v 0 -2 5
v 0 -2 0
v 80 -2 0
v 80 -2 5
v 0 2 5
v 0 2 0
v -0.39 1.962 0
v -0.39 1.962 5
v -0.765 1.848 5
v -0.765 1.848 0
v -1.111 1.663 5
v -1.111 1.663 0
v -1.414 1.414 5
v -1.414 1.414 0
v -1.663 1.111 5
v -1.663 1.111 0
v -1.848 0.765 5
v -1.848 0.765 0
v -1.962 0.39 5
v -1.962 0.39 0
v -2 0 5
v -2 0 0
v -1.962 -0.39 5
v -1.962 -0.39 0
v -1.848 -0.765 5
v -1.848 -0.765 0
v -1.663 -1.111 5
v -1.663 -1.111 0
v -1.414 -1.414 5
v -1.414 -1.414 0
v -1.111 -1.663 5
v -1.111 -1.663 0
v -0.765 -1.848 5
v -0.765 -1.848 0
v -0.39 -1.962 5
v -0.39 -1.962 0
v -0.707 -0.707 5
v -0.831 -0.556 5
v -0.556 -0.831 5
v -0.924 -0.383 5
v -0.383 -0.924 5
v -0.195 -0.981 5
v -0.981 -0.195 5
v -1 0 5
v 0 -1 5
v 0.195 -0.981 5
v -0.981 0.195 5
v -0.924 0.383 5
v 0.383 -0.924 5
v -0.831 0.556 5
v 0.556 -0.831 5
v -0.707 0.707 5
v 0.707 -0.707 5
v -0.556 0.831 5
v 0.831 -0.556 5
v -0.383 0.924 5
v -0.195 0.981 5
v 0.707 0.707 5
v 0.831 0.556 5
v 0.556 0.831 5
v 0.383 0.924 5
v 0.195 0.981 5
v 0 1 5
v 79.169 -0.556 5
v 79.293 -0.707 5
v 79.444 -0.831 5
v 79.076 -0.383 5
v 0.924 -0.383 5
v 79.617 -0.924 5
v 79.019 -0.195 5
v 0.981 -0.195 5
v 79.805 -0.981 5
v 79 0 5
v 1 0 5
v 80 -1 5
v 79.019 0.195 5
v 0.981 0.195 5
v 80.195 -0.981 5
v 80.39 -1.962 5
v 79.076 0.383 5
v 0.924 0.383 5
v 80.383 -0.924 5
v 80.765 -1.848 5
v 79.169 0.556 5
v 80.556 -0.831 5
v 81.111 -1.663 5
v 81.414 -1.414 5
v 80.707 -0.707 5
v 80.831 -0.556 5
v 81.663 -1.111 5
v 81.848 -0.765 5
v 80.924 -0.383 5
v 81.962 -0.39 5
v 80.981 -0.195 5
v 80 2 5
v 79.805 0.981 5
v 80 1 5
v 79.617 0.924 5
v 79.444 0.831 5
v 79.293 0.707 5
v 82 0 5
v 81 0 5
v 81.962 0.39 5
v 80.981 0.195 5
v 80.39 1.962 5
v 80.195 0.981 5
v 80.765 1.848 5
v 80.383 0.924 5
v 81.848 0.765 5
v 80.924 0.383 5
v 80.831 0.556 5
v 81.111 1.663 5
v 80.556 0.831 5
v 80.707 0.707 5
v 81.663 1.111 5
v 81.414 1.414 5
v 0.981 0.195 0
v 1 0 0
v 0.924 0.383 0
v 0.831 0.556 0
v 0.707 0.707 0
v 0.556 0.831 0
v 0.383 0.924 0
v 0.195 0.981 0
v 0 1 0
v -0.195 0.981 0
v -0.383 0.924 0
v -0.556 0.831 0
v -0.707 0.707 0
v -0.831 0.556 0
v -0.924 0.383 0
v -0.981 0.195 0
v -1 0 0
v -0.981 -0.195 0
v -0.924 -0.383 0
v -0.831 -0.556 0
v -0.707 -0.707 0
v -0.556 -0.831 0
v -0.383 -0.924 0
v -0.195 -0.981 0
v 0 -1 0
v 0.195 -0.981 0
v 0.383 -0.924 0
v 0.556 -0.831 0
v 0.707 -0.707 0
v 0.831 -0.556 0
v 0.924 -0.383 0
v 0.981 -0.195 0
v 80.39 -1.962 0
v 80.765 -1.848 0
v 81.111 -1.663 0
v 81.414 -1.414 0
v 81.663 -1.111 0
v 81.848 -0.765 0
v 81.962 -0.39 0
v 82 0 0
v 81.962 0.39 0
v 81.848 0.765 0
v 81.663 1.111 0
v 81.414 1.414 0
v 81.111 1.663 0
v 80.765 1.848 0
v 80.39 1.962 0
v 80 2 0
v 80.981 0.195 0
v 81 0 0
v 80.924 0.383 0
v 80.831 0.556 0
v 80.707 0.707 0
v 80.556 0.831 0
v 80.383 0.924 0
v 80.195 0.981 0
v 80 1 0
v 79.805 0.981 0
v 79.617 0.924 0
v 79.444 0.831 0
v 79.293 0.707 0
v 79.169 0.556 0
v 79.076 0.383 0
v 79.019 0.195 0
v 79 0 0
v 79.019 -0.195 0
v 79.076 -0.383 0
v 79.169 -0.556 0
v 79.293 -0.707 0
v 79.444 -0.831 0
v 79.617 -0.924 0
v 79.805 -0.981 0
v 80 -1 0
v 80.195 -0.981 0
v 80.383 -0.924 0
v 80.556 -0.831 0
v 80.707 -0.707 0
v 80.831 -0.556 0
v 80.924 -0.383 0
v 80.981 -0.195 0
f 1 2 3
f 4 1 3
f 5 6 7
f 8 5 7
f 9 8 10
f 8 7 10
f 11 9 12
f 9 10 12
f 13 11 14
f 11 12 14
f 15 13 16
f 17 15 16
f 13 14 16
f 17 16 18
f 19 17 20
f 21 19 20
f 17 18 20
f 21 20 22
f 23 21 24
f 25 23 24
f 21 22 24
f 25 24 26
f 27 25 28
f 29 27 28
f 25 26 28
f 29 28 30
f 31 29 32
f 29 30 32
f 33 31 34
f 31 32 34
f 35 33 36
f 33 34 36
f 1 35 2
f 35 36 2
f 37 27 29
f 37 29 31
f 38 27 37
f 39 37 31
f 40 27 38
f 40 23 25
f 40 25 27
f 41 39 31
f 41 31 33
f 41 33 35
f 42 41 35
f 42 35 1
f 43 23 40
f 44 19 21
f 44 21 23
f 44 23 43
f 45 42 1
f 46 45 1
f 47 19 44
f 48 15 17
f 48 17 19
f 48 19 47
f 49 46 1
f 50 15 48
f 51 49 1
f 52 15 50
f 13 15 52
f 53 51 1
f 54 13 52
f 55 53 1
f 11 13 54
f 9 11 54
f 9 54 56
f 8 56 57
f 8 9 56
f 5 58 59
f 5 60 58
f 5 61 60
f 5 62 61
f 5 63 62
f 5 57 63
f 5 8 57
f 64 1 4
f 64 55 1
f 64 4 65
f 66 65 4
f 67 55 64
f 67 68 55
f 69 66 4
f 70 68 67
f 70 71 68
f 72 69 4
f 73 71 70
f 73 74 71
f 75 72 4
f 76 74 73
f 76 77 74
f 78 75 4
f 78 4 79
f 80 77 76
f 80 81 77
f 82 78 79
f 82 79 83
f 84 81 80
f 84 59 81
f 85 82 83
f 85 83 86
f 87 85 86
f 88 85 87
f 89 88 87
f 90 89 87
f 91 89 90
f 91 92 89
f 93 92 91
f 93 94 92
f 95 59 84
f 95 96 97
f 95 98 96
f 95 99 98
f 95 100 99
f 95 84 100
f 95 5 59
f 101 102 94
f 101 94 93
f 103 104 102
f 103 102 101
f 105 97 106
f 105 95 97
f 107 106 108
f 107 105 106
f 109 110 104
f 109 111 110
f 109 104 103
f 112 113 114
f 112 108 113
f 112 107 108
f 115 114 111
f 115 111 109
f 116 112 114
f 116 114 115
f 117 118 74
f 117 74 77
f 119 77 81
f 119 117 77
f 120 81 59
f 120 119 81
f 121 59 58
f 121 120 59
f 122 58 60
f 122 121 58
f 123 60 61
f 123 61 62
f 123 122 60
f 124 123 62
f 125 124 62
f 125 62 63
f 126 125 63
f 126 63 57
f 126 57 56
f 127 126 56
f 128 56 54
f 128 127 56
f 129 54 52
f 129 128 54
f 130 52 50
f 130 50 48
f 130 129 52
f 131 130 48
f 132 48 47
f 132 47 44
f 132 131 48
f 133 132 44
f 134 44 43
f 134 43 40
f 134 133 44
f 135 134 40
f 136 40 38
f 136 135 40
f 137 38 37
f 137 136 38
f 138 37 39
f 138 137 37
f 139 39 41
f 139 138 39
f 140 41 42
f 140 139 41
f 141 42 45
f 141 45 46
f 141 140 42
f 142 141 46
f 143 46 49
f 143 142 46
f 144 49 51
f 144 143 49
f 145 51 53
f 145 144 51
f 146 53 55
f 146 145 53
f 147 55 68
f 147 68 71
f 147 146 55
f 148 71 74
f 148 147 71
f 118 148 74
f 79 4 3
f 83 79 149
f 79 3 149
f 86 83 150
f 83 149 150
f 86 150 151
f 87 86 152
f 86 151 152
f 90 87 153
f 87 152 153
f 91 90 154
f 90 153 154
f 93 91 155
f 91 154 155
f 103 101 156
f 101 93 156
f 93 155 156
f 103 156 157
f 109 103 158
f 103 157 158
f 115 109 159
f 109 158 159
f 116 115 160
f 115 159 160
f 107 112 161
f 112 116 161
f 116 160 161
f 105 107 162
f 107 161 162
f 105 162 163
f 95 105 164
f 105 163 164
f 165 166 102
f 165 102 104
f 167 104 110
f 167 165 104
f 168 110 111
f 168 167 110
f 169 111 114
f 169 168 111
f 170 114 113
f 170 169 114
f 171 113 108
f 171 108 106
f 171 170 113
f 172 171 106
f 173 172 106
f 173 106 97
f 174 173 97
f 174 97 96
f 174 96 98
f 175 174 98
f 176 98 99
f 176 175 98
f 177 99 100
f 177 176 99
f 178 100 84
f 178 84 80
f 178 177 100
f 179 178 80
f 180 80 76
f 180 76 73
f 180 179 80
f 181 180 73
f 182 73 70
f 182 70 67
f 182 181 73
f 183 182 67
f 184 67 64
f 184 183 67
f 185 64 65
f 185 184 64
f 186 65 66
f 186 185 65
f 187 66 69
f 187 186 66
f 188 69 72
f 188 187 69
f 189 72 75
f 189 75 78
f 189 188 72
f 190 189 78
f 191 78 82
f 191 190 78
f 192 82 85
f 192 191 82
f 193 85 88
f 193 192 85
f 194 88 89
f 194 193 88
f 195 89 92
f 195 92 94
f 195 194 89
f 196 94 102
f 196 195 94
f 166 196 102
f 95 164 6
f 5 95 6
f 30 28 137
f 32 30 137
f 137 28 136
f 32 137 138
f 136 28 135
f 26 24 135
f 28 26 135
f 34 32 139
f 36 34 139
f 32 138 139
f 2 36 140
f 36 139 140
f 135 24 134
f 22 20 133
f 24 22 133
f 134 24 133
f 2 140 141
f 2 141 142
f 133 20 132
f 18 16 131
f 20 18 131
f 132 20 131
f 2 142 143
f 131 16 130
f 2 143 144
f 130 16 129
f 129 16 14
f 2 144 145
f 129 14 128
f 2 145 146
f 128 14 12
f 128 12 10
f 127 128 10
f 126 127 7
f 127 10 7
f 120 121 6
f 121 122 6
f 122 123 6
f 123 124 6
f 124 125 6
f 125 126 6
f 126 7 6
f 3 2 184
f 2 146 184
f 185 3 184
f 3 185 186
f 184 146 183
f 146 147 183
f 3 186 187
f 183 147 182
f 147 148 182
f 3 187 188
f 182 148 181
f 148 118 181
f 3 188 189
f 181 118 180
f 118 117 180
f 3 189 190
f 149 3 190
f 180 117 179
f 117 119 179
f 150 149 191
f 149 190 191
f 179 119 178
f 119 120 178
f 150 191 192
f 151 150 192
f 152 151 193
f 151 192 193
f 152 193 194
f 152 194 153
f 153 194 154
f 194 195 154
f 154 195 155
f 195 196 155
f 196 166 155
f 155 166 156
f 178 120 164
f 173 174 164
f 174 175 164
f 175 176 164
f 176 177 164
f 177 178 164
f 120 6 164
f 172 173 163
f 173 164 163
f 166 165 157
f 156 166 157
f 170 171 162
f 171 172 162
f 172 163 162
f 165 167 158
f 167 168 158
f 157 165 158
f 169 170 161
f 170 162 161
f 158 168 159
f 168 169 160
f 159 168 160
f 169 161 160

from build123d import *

# Parameters (mm, degrees)
SKETCH_2_R      = 2
SKETCH_2_R_2    = 1
EXTRUDE_1_DEPTH = 5


with BuildPart() as part:
    # 草图2 → 凸台-拉伸1 (new body)
    # profile 1 of 3: a face of its own
    with BuildSketch(Plane.XY):
        Circle(SKETCH_2_R)
        Circle(SKETCH_2_R_2, mode=Mode.SUBTRACT)
    # profile 2 of 3: a face of its own
    with BuildSketch(Plane.XY):
        with BuildLine():
            ThreePointArc((2, 0), (1.414213562, -1.414213562), (0, -2))
            Line((0, -2), (80, -2))
            ThreePointArc((80, -2), (78, 0), (80, 2))
            Line((80, 2), (0, 2))
            ThreePointArc((0, 2), (1.414213562, 1.414213562), (2, 0))
        make_face()
    # profile 3 of 3: a face of its own
    with BuildSketch(Plane.XY):
        with Locations((80, 0)):
            Circle(SKETCH_2_R)
        with Locations((80, 0)):
            Circle(SKETCH_2_R_2, mode=Mode.SUBTRACT)
    extrude(amount=EXTRUDE_1_DEPTH)


solid = part.part
